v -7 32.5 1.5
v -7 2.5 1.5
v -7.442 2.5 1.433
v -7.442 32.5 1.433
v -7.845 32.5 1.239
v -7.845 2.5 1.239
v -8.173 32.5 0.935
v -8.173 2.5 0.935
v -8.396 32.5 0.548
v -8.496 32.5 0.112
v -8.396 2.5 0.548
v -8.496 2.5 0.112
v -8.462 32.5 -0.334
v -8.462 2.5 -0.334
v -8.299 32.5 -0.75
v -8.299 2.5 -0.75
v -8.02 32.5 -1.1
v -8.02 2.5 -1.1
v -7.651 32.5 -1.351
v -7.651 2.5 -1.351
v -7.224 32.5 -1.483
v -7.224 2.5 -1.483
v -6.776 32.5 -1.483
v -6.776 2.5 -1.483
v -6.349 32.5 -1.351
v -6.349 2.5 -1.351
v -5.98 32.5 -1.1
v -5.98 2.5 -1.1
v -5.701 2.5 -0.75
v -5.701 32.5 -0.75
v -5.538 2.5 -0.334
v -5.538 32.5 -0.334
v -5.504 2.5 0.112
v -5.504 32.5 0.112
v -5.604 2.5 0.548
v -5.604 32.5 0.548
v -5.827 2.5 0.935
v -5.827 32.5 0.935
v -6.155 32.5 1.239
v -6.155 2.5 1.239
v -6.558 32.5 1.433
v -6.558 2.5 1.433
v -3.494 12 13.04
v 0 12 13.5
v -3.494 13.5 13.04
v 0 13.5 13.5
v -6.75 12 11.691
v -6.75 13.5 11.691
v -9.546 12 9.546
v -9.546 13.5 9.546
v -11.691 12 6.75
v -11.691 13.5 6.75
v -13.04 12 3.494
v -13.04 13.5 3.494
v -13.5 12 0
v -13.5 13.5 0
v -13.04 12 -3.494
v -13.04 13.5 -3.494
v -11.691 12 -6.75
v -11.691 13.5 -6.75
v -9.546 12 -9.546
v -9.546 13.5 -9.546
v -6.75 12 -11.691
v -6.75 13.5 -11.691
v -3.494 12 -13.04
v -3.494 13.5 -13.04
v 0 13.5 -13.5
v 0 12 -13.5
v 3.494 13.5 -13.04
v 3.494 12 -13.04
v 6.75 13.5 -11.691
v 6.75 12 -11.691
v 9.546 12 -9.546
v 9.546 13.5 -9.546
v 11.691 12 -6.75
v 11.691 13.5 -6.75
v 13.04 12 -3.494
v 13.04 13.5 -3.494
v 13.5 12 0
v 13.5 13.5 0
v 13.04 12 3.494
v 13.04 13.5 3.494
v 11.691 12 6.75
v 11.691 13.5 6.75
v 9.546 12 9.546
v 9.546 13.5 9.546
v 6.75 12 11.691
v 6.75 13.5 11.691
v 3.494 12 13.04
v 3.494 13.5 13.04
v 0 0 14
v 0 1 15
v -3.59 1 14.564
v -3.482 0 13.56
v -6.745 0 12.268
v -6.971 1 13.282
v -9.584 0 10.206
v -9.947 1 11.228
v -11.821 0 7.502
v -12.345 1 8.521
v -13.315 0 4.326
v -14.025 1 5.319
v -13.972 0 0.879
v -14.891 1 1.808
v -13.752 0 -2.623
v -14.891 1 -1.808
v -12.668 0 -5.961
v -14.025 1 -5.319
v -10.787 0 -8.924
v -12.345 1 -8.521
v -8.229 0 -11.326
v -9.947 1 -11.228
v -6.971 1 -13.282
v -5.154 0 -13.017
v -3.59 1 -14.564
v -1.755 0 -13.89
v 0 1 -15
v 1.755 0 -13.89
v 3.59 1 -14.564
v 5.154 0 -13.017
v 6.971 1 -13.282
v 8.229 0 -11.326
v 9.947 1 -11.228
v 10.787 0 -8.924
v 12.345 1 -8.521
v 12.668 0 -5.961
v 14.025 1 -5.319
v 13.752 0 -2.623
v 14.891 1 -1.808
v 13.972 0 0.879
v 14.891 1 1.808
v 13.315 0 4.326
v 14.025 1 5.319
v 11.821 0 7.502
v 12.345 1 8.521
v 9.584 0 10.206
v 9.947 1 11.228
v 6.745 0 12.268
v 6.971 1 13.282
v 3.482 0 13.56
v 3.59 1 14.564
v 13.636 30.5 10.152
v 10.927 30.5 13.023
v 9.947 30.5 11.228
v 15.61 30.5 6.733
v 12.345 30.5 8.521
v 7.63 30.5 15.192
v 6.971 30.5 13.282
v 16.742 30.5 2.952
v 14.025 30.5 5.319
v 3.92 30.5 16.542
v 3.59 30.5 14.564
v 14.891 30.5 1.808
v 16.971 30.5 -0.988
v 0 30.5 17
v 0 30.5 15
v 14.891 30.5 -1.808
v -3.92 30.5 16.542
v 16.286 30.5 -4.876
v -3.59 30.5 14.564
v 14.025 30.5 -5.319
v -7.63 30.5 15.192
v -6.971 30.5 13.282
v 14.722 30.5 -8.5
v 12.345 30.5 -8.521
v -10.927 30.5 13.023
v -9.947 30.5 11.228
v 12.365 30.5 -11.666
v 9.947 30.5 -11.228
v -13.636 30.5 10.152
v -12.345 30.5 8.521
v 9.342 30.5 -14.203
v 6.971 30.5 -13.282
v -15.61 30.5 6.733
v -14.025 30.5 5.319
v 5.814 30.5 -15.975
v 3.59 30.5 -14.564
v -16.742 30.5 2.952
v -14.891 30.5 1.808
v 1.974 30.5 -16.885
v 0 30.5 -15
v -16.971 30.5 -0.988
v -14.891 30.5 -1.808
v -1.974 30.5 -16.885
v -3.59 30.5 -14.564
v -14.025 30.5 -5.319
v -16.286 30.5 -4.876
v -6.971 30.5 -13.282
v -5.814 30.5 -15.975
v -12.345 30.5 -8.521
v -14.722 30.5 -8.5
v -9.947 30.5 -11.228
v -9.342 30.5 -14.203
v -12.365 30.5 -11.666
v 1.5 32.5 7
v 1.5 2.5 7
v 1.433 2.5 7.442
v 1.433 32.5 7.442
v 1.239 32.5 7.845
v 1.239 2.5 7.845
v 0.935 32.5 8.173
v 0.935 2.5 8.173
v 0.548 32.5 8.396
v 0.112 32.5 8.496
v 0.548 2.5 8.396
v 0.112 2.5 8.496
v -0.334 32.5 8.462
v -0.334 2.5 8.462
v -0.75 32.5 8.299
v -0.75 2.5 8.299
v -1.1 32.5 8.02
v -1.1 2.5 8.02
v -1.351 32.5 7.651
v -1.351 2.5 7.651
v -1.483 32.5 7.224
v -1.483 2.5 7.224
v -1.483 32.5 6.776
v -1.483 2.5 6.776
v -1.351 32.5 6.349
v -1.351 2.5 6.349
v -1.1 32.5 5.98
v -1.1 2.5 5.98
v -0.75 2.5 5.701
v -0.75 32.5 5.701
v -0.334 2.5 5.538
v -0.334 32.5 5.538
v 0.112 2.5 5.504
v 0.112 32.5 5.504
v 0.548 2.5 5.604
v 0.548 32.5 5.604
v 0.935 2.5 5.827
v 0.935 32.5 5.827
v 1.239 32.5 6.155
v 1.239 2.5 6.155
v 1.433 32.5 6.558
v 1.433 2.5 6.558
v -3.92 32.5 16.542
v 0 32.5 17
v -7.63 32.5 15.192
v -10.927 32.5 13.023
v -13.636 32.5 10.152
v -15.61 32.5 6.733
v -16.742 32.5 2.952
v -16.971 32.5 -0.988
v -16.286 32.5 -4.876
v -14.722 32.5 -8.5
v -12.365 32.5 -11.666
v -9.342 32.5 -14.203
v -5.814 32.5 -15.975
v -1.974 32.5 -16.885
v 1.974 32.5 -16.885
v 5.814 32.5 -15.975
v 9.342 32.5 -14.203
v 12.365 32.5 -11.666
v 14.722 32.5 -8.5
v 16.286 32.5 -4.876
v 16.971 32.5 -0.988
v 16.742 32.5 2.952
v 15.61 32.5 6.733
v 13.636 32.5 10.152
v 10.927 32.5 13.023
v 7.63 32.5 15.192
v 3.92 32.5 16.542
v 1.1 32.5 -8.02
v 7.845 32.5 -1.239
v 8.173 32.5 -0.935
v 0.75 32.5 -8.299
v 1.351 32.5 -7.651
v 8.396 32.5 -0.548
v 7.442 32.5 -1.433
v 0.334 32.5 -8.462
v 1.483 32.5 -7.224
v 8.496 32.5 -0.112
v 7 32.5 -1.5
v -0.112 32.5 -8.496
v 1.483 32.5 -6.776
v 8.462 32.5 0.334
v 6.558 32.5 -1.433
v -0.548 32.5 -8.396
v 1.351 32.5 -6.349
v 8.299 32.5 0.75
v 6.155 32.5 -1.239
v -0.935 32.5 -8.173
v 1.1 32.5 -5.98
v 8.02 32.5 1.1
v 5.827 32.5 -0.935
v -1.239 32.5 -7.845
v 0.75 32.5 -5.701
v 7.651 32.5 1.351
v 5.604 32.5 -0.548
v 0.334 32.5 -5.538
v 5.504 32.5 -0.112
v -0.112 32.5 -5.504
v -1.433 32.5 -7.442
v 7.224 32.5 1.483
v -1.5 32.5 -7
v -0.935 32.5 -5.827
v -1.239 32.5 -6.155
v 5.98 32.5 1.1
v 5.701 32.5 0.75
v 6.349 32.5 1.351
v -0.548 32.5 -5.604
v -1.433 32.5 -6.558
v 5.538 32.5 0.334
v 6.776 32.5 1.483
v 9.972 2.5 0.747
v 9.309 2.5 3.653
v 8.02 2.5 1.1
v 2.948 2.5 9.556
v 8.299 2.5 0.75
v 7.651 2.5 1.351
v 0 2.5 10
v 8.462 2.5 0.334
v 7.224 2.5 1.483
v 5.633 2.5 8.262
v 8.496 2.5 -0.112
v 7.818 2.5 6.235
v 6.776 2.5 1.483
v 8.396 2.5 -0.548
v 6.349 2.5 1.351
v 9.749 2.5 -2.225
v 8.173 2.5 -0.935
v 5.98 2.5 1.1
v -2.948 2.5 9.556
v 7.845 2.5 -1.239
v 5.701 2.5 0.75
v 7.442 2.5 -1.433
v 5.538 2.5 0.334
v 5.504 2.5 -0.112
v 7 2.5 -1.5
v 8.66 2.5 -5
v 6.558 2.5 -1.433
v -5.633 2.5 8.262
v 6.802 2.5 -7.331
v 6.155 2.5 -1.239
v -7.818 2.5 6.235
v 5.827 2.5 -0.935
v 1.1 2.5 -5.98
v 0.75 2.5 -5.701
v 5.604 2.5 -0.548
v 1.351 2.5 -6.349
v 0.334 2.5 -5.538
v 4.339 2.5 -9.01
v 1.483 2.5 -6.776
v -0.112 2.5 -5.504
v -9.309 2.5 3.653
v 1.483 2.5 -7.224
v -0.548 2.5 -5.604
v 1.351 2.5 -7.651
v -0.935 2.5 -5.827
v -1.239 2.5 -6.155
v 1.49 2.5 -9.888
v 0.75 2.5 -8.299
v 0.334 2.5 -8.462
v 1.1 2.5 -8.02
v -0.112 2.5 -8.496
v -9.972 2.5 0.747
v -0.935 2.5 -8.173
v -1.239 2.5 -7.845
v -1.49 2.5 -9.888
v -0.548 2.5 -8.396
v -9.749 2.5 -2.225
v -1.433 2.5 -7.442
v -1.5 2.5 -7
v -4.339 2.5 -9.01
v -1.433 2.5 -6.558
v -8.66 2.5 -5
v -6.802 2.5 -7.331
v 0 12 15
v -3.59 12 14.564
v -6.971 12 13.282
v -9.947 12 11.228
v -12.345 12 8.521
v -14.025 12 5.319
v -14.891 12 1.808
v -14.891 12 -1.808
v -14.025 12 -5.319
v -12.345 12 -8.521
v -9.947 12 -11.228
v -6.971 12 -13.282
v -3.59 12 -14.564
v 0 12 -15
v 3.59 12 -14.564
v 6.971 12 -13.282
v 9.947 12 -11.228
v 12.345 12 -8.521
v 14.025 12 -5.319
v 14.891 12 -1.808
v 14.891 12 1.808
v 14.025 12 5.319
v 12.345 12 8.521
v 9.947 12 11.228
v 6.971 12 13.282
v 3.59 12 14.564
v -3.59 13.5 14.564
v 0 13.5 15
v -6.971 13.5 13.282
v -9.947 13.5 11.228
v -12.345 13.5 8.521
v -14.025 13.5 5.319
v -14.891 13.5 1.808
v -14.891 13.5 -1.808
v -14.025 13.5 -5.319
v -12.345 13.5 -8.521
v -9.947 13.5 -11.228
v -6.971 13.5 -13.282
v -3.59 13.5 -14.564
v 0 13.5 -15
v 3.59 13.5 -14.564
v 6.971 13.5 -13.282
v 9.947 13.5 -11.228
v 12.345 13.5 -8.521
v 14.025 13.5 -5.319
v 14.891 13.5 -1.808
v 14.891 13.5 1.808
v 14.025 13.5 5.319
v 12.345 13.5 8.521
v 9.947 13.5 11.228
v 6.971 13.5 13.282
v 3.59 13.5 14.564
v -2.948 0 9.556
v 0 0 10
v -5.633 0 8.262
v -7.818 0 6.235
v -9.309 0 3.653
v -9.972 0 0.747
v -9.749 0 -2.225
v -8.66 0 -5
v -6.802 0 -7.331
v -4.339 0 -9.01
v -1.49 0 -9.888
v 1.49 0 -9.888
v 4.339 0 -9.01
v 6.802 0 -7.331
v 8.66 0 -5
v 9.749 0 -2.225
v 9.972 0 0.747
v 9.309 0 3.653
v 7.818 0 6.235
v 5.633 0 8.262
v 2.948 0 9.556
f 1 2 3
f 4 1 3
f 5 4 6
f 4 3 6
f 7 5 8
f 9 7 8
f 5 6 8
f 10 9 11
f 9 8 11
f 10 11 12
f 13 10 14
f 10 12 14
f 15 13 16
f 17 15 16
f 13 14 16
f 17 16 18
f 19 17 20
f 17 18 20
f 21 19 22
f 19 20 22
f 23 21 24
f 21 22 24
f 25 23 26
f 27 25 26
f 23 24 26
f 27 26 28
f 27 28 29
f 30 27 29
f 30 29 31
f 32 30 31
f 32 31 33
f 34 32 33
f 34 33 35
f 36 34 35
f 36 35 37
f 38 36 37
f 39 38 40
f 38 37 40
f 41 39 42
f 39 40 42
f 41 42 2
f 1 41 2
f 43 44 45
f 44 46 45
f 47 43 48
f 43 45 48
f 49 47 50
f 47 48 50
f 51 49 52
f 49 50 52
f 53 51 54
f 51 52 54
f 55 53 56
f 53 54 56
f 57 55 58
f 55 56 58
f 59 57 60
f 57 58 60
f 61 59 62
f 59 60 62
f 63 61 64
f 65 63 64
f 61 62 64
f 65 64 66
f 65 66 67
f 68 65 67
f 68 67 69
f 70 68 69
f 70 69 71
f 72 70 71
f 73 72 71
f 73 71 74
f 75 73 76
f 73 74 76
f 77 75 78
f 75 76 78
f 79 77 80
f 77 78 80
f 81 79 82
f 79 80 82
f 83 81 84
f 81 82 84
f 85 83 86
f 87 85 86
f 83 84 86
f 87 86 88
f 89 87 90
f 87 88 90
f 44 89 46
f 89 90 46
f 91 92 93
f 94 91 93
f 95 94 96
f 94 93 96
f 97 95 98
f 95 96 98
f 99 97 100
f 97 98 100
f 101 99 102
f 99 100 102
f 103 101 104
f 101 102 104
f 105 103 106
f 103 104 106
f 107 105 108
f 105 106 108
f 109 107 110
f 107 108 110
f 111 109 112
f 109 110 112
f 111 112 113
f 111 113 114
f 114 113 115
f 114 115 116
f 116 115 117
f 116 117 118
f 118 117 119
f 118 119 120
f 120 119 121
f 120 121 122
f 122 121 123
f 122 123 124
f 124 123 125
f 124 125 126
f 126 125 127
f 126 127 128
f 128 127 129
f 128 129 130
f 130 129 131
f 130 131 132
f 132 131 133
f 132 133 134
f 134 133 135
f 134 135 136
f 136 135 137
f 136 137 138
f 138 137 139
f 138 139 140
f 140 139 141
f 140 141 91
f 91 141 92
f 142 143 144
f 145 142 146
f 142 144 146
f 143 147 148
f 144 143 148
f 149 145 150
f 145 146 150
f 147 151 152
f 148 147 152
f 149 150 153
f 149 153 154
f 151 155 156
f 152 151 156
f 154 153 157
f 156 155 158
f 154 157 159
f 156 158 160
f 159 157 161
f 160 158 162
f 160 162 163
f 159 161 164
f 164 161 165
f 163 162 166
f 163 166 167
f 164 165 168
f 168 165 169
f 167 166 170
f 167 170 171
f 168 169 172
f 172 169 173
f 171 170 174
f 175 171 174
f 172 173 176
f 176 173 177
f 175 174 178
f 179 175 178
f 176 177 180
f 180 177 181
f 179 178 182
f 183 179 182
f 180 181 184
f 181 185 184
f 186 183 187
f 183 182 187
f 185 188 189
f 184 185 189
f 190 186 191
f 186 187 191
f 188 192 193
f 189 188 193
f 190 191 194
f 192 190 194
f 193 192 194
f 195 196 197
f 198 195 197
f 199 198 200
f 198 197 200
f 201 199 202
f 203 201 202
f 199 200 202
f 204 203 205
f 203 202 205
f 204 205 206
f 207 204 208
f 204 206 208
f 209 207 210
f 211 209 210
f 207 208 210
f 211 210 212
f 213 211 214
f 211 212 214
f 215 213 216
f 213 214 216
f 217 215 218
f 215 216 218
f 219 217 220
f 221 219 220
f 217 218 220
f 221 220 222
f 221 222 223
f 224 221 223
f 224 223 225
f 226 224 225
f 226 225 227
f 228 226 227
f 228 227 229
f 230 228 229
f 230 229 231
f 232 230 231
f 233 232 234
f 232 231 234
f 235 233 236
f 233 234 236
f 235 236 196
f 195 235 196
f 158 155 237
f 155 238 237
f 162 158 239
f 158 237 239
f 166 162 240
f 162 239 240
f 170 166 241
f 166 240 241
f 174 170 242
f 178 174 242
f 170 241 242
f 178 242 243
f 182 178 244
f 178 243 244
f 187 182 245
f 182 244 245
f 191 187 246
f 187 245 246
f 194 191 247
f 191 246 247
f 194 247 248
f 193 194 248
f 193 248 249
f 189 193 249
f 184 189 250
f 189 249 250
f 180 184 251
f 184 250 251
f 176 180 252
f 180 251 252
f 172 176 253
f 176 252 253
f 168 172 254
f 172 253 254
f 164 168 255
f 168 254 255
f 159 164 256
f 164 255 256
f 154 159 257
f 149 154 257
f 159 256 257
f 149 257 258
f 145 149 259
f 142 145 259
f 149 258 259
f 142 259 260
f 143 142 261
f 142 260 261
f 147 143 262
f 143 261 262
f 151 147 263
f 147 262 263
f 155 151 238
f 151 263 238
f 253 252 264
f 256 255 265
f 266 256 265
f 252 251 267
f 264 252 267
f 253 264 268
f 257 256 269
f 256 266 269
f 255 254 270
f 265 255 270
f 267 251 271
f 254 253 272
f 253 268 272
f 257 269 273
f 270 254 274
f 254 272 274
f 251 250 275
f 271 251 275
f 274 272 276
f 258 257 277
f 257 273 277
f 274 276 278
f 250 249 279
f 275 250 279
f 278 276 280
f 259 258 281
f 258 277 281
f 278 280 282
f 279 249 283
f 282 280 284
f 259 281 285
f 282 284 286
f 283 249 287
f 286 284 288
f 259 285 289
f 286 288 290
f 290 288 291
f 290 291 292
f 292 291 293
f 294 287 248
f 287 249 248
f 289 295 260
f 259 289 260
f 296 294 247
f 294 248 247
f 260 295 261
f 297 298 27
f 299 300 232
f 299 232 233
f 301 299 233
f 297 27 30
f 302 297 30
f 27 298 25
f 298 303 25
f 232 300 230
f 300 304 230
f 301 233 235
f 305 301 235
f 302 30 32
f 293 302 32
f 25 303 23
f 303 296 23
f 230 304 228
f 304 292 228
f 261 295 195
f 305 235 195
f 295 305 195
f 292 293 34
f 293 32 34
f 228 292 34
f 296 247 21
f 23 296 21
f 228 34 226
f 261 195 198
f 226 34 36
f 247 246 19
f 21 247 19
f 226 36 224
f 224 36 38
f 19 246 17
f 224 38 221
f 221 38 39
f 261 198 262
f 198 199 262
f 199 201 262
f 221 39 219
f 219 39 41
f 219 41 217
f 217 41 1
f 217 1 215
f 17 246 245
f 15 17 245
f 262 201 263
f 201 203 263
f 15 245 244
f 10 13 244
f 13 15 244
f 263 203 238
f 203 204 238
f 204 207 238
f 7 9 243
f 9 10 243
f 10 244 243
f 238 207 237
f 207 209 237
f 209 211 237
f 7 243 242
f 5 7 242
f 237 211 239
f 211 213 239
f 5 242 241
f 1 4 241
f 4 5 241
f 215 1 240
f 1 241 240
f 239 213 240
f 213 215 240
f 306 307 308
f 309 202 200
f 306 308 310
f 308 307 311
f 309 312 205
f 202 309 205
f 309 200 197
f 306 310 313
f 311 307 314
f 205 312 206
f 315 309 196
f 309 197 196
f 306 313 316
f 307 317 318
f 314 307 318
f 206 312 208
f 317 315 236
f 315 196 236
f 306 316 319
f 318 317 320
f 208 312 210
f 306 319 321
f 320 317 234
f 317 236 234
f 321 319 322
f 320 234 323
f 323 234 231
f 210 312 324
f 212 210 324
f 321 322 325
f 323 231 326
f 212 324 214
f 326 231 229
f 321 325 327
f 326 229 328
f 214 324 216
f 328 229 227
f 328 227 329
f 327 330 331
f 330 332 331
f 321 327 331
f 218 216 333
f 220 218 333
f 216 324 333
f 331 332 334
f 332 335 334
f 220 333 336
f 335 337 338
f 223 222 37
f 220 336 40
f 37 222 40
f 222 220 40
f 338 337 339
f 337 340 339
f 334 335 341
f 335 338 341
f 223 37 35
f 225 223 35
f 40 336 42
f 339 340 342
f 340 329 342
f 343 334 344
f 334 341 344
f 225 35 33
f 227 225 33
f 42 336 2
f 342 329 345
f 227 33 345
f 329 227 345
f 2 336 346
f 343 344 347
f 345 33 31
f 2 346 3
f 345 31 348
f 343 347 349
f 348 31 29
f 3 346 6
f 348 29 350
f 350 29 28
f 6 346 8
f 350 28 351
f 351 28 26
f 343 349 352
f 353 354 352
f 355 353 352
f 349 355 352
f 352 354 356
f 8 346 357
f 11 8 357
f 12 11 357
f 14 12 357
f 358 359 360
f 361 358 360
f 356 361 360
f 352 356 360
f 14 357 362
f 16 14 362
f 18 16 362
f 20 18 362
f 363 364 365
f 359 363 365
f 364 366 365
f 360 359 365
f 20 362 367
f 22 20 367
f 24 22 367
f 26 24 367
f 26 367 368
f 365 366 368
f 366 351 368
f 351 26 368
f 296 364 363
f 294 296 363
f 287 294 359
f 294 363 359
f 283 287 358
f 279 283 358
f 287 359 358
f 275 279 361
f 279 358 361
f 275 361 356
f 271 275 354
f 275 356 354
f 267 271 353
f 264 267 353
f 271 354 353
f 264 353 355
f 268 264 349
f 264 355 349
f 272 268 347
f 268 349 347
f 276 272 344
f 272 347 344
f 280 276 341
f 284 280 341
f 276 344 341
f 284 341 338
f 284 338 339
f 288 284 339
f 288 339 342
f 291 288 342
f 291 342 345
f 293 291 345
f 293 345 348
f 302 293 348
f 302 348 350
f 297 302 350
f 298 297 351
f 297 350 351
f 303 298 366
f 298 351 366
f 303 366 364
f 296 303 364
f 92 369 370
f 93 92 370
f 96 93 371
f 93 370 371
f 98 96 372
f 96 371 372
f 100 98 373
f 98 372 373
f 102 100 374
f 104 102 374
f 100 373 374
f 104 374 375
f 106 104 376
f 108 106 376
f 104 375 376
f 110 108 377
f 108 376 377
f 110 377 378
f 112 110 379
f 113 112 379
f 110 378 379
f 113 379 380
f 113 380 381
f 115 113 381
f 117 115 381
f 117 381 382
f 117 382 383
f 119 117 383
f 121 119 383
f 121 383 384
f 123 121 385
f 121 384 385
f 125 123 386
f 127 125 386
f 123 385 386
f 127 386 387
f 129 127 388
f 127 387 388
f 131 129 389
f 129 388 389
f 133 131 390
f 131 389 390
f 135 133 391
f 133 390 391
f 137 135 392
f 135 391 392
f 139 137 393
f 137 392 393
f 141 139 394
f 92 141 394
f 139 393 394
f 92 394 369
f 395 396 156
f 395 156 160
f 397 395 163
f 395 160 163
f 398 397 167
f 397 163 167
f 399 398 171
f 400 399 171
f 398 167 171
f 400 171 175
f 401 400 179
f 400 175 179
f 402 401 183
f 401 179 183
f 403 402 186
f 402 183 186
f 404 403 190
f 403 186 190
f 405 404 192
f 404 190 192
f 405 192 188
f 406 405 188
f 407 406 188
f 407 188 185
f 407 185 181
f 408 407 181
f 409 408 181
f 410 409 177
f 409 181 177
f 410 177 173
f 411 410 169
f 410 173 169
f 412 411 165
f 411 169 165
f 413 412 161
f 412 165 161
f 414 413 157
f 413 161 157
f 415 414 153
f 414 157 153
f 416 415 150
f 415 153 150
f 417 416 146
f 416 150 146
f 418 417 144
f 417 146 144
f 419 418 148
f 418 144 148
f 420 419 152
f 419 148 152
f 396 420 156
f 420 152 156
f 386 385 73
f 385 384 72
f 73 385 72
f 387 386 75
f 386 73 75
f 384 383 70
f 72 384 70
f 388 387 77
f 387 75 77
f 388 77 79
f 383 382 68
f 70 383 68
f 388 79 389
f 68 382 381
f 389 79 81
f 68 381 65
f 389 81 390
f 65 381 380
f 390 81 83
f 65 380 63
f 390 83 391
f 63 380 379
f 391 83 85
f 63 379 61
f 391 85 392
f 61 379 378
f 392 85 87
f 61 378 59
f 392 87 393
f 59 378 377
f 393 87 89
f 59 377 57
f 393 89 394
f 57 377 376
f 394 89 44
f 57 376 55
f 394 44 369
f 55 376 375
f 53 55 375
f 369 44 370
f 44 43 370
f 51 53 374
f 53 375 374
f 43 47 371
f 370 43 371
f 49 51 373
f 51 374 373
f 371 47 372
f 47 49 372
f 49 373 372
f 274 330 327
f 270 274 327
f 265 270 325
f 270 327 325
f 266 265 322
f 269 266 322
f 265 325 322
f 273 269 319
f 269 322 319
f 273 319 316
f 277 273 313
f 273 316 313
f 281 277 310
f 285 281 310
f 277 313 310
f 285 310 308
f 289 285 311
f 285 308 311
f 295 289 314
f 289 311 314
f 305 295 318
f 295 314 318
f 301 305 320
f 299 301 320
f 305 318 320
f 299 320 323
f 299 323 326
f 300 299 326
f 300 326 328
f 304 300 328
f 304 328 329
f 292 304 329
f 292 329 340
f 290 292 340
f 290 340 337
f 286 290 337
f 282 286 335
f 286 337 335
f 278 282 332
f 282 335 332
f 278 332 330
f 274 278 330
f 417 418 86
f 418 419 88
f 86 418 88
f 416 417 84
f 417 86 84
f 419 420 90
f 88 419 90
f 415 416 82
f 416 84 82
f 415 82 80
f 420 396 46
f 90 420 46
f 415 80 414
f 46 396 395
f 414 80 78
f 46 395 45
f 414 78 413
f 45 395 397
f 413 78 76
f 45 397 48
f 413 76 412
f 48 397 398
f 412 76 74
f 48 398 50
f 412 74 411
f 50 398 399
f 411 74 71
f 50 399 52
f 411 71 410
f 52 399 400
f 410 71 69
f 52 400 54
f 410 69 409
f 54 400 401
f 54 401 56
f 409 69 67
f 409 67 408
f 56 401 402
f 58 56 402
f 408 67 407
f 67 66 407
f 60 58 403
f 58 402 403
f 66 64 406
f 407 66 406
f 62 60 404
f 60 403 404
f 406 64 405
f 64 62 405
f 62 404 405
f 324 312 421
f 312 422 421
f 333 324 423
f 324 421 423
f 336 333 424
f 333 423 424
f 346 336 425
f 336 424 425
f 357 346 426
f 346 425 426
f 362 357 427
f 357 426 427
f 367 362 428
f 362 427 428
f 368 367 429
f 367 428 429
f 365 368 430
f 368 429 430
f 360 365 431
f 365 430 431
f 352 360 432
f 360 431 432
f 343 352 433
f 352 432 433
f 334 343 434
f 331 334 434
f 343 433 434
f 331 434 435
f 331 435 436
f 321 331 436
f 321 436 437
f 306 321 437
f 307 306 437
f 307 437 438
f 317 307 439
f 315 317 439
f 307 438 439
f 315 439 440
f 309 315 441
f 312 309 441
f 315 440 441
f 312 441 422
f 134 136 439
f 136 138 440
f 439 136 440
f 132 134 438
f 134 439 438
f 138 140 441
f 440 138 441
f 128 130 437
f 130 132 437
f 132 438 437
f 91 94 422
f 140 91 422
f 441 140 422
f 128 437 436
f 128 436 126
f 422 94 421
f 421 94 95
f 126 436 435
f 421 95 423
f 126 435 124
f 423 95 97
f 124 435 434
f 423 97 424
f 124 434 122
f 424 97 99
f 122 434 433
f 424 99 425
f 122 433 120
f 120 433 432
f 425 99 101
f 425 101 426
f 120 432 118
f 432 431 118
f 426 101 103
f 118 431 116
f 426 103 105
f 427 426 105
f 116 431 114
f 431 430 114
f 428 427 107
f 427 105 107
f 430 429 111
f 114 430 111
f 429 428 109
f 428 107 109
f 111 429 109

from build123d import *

# Parameters (mm, degrees)
CHAMFER_1_SIZE           = 1
SKETCH_8_R               = 1.5
CUT_EXTRUDE_1_DEPTH      = 30
PATTERN_CIRCULAR_1_COUNT = 4


with BuildPart() as part:
    # Эскиз7 → Повернуть1 (revolve)
    with BuildSketch(Plane(origin=(0, 0, 0), x_dir=(0, 0, -1), z_dir=(1, 0, 0)), mode=Mode.PRIVATE) as revolve_1_sk:
        Polygon((10, 0), (15, 0), (15, 12), (13.5, 12), (13.5, 13.5), (15, 13.5), (15, 30.5), (17, 30.5), (17, 32.5), (0, 32.5), (0, 2.5), (10, 2.5), align=None)
    revolve(revolve_1_sk.sketch.rotate(Axis((0, 32.703148984, 0), (0, -1, 0)), 180), axis=Axis((0, 32.703148984, 0), (0, -1, 0)))

    # Фаска1
    chamfer_1_edges = [part.edges().sort_by_distance(p)[0] for p in [
        (0, 0, -15),
    ]]
    chamfer(chamfer_1_edges, length=CHAMFER_1_SIZE)

    # Эскиз8 → Вырез-Вытянуть1 (cut)
    with BuildSketch(Plane.XZ.offset(-2.5)):
        with Locations(Location((7, 0, 0), (0, 0, 270))):
            Circle(SKETCH_8_R)
    cut_extrude_1 = extrude(amount=-CUT_EXTRUDE_1_DEPTH, mode=Mode.SUBTRACT)

    # Круговой массив1: Вырез-Вытянуть1 ×4 about axis
    pattern_circular_1_axis = Axis((0, 0, 0), (0, 1, 0))
    for i in range(1, PATTERN_CIRCULAR_1_COUNT):
        add(cut_extrude_1.rotate(pattern_circular_1_axis, i * 360 / PATTERN_CIRCULAR_1_COUNT), mode=Mode.SUBTRACT)


solid = part.part
